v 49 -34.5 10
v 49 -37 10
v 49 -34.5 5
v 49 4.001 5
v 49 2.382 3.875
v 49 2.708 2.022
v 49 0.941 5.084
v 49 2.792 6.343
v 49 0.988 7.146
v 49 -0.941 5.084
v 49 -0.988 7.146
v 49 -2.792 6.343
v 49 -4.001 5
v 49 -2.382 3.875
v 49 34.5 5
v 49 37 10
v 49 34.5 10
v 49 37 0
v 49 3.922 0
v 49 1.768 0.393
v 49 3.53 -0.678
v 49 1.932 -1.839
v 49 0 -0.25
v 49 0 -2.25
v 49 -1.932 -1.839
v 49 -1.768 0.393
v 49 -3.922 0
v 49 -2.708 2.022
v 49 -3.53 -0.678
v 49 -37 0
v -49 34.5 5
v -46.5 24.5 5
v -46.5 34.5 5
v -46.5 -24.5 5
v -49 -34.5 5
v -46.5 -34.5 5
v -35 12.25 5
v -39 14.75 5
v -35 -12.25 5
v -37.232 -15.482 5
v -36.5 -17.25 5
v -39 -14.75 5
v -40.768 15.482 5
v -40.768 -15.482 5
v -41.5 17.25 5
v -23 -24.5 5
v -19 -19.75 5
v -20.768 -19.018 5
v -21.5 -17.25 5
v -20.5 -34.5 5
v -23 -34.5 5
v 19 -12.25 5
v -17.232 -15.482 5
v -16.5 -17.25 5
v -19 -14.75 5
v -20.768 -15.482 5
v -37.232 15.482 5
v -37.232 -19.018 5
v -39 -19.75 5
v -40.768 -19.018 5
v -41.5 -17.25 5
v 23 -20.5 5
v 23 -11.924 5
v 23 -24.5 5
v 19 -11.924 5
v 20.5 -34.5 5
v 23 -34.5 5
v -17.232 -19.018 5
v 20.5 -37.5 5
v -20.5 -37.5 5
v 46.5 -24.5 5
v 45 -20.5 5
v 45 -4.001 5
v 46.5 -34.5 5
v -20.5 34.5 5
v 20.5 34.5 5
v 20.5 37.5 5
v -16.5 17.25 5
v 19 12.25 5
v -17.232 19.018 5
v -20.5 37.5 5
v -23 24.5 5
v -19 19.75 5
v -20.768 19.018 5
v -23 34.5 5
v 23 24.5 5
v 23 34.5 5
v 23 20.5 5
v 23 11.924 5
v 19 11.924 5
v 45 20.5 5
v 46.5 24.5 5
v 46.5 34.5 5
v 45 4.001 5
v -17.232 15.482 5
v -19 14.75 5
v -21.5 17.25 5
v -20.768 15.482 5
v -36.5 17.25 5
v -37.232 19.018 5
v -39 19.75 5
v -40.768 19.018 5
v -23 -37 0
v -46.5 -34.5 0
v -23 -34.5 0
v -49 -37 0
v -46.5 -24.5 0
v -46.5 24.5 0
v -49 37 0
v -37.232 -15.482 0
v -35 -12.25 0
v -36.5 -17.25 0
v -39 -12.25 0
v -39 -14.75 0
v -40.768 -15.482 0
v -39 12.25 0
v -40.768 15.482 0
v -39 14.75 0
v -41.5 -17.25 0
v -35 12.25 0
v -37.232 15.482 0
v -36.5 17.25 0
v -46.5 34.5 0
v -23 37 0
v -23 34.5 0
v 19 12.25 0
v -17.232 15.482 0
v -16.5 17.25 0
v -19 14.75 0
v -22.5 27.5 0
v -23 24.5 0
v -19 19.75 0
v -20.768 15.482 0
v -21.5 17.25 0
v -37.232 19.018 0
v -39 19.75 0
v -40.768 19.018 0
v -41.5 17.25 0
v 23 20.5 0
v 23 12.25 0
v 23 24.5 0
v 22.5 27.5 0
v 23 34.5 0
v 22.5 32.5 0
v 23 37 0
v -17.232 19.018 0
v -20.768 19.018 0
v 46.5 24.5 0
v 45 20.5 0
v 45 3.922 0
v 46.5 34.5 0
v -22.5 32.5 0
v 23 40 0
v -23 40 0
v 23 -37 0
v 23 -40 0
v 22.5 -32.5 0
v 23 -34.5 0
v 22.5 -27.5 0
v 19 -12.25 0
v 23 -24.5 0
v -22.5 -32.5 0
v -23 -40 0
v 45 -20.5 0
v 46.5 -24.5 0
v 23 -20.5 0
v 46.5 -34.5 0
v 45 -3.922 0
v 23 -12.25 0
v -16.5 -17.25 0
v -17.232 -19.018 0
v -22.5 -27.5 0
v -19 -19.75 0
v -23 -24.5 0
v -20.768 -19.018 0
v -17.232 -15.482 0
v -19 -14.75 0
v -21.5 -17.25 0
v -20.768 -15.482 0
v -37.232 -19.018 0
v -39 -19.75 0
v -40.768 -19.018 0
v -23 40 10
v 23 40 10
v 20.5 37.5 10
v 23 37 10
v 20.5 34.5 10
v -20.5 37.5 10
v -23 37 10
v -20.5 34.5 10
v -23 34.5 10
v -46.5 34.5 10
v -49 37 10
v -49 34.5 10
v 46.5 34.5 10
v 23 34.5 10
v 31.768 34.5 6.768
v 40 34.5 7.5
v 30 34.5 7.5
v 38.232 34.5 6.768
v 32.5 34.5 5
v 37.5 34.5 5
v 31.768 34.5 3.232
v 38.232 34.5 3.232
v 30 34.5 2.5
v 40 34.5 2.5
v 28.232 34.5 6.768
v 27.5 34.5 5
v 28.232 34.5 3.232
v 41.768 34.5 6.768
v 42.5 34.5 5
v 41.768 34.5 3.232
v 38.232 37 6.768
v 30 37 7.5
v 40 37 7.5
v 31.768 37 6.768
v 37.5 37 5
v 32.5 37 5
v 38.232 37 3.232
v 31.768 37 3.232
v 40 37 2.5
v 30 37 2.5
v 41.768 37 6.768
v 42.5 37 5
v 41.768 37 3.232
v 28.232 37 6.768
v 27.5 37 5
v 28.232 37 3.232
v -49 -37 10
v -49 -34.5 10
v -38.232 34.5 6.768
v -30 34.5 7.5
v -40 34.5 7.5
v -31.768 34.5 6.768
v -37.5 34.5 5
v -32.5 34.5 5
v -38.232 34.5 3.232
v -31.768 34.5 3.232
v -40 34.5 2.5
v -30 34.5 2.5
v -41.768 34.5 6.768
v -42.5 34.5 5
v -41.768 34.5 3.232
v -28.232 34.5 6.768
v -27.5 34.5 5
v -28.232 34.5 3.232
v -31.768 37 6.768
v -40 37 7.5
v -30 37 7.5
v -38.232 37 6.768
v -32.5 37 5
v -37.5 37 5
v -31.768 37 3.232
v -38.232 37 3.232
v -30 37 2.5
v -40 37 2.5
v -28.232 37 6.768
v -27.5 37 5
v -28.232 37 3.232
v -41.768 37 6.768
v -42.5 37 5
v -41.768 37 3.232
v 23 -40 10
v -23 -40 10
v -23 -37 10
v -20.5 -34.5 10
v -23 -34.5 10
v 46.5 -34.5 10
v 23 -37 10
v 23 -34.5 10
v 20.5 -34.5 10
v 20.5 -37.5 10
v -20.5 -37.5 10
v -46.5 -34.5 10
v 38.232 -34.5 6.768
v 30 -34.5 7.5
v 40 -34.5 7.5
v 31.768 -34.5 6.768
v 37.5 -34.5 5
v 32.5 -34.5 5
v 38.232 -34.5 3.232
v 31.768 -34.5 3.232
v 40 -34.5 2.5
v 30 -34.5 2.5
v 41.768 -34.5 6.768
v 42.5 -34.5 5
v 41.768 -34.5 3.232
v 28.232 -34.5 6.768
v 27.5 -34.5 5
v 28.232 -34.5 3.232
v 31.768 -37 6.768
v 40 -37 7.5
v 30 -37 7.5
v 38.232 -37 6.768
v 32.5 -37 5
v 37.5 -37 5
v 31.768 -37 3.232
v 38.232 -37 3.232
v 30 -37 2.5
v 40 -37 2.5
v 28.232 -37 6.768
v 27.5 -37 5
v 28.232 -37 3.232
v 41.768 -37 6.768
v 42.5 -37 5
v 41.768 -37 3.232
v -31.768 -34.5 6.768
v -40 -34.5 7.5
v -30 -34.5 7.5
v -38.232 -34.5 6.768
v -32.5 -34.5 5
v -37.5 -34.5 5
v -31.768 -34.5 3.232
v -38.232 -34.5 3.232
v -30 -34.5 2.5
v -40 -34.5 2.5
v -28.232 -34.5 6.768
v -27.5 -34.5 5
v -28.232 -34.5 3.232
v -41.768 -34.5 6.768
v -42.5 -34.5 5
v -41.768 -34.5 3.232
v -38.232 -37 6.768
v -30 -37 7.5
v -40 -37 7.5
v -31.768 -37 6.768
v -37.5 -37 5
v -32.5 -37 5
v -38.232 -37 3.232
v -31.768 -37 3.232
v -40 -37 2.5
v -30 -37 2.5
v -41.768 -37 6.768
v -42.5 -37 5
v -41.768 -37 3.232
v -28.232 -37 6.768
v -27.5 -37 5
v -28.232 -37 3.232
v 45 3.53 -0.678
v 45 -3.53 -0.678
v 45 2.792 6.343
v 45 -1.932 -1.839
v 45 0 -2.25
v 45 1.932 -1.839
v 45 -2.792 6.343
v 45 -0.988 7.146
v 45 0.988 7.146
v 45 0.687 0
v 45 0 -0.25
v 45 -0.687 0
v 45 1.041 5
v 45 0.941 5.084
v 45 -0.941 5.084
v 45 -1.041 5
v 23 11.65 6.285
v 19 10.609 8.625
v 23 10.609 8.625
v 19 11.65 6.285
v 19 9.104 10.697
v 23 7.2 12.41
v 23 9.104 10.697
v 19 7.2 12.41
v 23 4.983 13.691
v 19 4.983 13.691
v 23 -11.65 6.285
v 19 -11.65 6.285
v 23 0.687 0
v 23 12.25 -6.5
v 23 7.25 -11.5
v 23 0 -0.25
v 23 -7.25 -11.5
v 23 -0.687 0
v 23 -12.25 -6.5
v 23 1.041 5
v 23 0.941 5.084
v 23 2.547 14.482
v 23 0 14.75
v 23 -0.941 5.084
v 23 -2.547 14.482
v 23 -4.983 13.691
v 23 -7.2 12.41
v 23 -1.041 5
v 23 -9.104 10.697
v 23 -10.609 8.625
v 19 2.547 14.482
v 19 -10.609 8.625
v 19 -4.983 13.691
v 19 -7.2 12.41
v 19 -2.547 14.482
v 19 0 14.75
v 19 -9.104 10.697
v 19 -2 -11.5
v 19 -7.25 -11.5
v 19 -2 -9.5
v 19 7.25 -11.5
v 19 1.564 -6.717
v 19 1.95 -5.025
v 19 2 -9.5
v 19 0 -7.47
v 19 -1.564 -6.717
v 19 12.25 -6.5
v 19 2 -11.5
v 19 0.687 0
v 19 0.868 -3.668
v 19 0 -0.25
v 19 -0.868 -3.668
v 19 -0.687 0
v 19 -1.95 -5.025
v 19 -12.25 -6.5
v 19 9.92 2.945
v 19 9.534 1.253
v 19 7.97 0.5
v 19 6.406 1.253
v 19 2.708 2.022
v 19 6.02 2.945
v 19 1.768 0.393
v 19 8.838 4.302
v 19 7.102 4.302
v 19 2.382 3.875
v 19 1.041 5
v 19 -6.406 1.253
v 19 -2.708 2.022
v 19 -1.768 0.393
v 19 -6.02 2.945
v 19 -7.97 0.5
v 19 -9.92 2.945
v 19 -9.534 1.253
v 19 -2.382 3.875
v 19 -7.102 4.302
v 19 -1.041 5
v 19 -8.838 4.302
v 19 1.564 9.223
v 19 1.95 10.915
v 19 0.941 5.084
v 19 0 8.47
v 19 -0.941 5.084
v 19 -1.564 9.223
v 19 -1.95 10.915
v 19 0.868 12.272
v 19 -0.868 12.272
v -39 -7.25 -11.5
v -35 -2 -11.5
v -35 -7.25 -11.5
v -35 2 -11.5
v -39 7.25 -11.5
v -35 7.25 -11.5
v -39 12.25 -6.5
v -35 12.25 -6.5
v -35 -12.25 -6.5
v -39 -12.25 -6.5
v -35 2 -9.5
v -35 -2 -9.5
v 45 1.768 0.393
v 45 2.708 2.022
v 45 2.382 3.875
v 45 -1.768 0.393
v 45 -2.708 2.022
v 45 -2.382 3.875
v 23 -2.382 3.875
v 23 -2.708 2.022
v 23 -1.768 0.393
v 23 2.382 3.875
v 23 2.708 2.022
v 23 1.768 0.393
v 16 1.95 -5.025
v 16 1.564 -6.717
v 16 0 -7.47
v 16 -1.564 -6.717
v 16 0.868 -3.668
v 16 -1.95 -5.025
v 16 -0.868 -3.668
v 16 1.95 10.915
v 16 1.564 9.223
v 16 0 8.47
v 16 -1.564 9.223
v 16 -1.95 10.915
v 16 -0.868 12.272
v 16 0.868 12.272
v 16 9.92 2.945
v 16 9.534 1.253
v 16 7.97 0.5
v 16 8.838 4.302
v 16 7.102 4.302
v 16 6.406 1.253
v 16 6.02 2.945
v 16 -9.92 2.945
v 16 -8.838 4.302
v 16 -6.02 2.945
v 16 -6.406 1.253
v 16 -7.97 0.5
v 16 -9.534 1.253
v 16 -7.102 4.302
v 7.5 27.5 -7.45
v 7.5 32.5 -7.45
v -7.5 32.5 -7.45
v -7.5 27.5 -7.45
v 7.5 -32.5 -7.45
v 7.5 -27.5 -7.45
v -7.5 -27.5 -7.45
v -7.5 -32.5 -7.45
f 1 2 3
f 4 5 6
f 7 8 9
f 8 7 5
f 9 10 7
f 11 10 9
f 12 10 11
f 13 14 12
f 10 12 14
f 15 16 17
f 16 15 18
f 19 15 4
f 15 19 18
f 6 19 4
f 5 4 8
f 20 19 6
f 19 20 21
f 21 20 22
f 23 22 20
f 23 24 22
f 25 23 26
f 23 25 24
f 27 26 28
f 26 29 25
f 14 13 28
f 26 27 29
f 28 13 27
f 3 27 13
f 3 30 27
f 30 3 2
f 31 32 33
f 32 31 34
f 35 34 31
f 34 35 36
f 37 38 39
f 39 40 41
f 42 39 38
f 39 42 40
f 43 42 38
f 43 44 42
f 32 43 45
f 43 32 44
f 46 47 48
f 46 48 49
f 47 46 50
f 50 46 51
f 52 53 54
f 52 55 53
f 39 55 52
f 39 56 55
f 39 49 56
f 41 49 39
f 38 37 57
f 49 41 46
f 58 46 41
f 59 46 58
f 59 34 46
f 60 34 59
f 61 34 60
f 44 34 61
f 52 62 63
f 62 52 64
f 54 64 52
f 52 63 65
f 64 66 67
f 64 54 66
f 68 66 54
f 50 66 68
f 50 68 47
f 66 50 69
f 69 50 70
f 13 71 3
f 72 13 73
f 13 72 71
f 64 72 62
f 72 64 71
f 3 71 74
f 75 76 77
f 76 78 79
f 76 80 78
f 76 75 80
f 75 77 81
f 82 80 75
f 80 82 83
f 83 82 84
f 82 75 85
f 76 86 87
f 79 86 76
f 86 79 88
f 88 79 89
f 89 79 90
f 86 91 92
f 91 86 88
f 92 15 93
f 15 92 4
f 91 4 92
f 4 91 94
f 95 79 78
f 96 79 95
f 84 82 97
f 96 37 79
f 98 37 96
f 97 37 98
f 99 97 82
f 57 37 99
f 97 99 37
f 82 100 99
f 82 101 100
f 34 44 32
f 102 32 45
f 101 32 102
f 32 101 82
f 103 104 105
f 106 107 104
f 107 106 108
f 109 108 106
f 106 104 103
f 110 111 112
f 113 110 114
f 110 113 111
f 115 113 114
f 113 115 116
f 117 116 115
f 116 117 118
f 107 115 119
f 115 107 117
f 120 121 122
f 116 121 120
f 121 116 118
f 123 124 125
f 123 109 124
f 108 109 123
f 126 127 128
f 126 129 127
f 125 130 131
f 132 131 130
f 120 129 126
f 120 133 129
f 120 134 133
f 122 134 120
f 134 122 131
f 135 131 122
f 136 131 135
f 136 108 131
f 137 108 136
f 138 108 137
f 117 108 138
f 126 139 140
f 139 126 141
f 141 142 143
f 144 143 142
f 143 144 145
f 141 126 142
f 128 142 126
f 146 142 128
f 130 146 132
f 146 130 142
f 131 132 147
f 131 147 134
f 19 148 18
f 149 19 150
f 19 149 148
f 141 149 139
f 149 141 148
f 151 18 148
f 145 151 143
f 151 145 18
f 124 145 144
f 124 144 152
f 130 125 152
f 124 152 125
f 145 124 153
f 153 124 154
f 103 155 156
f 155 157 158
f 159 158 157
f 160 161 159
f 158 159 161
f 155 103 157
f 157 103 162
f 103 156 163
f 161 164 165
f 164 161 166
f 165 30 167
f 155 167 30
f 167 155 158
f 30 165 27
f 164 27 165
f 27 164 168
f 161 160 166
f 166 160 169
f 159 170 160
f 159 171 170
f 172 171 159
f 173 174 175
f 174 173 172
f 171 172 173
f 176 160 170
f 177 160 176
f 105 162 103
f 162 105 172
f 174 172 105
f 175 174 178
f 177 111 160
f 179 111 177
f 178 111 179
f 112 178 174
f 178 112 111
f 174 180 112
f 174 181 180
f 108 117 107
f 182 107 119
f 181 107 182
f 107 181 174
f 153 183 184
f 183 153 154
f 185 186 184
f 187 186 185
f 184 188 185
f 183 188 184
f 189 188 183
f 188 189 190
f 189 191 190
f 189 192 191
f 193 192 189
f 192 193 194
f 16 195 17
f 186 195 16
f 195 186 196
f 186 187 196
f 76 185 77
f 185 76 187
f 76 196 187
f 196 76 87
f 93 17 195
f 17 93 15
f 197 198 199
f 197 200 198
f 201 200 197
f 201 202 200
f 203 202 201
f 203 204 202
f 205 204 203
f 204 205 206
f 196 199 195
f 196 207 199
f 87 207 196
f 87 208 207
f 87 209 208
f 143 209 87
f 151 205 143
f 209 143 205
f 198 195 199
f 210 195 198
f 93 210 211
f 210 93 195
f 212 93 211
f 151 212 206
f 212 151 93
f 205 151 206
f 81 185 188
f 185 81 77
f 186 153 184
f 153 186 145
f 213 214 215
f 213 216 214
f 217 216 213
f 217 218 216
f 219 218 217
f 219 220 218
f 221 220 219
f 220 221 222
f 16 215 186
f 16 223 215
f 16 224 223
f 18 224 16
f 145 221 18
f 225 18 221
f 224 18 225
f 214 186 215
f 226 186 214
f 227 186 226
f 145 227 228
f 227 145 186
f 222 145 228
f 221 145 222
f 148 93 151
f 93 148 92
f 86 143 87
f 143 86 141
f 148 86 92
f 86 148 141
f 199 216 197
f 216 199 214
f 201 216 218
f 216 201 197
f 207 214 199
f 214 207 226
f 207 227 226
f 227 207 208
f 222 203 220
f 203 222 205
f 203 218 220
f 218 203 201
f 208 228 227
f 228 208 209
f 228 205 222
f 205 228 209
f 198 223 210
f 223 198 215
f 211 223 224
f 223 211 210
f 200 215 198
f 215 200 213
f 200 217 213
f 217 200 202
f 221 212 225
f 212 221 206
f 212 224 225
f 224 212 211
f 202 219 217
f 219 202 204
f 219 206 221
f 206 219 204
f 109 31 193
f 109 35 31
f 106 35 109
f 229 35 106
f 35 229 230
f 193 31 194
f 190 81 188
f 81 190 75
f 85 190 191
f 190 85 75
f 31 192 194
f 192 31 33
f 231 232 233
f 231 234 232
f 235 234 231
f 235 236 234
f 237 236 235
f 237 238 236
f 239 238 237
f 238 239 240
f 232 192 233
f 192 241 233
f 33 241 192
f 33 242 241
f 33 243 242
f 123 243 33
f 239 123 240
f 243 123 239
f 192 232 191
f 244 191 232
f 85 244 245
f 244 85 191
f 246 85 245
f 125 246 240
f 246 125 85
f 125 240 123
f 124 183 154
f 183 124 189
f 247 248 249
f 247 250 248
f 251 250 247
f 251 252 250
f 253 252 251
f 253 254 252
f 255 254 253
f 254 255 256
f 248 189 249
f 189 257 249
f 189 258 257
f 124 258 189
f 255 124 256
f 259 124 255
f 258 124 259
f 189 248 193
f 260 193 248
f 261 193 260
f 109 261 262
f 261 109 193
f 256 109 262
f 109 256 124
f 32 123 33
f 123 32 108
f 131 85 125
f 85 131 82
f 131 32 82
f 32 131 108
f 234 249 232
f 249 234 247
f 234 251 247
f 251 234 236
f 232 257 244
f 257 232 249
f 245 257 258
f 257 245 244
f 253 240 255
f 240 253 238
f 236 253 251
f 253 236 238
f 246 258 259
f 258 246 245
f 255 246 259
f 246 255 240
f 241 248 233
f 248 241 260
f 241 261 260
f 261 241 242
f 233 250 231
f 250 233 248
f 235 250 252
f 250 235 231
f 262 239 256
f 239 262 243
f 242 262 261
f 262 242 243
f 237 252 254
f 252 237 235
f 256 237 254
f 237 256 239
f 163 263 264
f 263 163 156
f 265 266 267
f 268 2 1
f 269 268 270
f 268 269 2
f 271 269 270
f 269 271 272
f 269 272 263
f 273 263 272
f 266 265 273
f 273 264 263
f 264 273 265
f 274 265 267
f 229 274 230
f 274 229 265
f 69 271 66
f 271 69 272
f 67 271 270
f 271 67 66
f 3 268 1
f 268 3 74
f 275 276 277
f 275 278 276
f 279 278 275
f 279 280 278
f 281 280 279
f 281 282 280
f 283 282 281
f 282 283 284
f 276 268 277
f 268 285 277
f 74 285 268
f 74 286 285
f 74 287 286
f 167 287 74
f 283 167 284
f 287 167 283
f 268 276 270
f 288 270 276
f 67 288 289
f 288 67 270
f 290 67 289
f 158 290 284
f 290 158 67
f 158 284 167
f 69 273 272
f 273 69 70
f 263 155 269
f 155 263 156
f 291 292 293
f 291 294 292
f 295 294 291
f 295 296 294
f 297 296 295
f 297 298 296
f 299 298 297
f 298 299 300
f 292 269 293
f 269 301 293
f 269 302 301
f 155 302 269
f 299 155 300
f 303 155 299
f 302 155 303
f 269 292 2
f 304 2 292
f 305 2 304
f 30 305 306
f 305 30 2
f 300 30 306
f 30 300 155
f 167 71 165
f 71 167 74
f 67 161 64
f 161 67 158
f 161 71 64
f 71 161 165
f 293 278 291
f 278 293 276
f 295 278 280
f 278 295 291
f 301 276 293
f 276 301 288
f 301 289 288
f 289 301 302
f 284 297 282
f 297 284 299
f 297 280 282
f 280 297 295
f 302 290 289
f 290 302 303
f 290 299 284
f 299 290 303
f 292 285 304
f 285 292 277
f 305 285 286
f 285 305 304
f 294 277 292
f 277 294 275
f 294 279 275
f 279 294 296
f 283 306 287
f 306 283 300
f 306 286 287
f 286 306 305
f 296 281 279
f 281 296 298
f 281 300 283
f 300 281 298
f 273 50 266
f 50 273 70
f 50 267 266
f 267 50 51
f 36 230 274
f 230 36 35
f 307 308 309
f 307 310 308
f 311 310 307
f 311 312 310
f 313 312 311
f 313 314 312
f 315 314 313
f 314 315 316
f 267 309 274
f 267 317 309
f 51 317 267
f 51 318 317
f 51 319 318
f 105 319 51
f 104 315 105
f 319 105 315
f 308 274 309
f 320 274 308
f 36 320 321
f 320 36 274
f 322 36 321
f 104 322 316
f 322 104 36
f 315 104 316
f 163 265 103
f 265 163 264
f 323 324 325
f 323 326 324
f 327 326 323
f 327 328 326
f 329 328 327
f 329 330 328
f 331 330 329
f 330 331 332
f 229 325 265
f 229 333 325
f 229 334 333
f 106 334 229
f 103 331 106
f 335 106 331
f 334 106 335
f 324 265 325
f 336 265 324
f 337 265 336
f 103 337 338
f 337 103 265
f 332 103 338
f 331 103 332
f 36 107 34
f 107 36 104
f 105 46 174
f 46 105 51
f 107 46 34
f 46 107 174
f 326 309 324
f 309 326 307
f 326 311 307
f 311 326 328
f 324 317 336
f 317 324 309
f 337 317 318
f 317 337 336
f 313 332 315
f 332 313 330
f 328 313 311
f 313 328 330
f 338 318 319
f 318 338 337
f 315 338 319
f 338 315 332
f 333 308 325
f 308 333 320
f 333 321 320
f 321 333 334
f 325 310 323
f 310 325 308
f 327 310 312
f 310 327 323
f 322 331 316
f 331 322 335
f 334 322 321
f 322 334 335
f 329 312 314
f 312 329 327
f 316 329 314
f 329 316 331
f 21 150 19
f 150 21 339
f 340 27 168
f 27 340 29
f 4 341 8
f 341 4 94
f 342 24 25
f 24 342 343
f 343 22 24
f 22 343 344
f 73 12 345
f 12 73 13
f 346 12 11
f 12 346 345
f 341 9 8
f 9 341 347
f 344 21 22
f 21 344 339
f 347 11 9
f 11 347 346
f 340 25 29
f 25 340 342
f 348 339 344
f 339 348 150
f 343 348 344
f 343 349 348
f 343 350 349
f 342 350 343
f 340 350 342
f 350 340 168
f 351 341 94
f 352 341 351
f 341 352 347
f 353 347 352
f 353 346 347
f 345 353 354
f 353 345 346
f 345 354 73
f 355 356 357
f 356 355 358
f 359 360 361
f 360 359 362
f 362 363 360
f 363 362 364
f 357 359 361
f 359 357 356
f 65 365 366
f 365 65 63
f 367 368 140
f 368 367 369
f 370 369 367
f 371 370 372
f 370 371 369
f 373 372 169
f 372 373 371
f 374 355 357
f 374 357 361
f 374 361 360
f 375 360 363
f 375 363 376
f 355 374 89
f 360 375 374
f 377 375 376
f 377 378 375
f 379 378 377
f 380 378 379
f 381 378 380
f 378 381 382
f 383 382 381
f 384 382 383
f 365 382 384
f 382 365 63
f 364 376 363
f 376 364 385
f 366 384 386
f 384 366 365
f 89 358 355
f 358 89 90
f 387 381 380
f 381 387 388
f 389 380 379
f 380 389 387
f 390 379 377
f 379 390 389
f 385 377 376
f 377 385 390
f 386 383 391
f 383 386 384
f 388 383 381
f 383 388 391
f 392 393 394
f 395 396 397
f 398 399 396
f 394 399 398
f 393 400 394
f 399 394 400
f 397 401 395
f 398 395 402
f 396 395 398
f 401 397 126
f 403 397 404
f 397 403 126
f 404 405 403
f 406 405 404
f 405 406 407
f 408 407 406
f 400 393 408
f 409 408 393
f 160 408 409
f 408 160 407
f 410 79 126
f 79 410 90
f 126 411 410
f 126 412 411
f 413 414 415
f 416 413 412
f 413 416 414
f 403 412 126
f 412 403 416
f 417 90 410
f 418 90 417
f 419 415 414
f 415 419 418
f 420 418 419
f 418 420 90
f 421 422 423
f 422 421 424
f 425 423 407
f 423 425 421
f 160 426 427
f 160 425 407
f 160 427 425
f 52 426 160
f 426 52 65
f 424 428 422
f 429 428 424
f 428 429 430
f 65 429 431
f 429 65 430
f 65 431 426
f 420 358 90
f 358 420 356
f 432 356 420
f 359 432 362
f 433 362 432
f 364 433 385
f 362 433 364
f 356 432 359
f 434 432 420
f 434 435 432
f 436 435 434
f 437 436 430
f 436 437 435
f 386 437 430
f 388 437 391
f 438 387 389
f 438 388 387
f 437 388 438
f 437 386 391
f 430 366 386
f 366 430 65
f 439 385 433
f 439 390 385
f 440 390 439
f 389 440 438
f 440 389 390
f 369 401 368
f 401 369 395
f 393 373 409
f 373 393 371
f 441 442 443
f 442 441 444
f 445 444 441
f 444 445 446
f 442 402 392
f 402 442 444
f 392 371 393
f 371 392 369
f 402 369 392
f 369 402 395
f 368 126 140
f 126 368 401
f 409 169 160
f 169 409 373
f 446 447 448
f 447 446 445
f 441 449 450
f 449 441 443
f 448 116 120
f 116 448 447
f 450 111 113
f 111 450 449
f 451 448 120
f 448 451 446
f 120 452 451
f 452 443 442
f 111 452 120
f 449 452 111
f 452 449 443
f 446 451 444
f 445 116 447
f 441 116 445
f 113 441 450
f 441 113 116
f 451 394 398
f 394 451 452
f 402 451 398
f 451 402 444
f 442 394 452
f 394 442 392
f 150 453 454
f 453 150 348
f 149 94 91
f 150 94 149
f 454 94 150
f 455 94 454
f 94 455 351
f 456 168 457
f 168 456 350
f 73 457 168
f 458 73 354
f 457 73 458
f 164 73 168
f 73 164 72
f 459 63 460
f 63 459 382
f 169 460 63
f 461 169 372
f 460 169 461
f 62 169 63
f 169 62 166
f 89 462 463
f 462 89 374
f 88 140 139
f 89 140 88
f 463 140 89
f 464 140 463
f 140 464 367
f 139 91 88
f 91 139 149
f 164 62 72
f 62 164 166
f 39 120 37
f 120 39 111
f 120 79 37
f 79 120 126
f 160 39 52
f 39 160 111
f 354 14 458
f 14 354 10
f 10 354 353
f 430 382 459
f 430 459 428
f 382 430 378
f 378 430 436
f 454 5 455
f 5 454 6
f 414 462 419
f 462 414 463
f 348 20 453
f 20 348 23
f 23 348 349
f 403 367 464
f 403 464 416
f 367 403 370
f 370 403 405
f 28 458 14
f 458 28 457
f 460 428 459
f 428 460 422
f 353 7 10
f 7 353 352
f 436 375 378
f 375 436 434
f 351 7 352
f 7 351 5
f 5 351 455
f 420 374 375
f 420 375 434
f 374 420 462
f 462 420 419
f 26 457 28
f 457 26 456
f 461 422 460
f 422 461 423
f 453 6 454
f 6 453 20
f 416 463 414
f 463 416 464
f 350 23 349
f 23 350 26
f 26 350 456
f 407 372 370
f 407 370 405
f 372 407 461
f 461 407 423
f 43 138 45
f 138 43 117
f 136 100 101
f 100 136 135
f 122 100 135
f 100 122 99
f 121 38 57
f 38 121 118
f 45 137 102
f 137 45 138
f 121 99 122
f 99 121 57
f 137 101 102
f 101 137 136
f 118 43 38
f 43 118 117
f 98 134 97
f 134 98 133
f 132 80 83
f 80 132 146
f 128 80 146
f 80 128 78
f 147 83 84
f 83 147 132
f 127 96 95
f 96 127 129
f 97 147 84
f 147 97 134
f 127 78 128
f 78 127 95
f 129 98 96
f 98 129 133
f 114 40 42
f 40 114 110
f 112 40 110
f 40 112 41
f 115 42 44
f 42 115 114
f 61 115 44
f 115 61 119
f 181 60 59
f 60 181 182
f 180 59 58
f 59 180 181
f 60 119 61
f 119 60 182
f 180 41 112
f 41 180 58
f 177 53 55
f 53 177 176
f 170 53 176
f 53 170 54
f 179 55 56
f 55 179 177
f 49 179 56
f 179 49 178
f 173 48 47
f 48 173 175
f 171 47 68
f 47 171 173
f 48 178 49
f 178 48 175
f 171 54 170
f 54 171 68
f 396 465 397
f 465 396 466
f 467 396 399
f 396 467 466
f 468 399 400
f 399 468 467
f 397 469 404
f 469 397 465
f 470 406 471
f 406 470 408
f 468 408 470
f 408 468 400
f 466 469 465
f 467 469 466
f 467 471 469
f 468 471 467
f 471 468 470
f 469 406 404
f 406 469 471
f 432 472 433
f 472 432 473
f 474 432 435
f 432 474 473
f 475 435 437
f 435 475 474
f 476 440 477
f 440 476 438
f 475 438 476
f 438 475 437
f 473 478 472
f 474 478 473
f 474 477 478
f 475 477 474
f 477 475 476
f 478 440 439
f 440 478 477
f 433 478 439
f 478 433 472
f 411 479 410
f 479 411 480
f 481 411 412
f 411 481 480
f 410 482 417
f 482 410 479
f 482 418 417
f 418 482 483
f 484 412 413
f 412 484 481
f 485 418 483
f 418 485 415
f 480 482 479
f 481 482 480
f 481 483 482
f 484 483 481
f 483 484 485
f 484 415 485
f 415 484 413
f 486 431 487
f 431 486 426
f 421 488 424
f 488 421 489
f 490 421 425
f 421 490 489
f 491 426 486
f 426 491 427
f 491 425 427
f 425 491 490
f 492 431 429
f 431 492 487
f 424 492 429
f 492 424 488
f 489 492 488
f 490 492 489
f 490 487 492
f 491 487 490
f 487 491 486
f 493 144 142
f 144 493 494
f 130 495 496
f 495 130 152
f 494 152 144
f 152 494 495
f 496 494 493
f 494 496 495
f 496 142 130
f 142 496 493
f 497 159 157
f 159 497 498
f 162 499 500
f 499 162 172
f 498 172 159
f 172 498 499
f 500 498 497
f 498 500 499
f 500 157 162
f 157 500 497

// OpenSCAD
/*
 * Copyright (c) 2026 Patrick Charon
 * Licensed under CERN-OHL-P <https://cern-ohl.web.cern.ch/>
*/

frame_length = 98;
frame_width = 80;
frame_thickness = 5;

border_width = 2.5;
border_height = 5;
total_height = frame_thickness + border_height;

mount_step_length = 26;
mount_hole_width = 10;

screw_hole_spacing = 10;
screw_hole_offset = 7;
screw_hole_diameter = 5;

beam_thickness = 4;

shaft_diameter = 5.5;

motor_bay_width = 24.5;
motor_bay_length = 54;
motor_bay_depth = 11.5;
motor_bay_bevel = 5;
motor_bay_bar_width = 4;
motor_bay_bar_thickness = 2;

board_rack_screw_spacing = 20;
board_rack_screw_x = 48;
board_rack_screw_y = 5;
board_rack_screw_diameter = 5;

motor_knob_spacing = 7.97;
motor_knob_height = 3;
motor_knob_diameter = 4;

underside_reinforcement_width = 5;
underside_reinforcement_height = 7.45;
underside_reinforcement_length = 45;
underside_reinforcement_bevel = 15;
underside_reinforcement_spacing = 55;

module quarter_frame(mount_step_depth=3) {
    mount_step_x = frame_length / 2 - mount_step_length;
    mount_step_y = frame_width / 2 - mount_step_depth;

    difference() {
        union() {
            cube([frame_length / 2, frame_width / 2, frame_thickness]);

            translate([
                mount_step_x - border_width, 
                mount_step_y - border_width,
                0
            ]) {
                cube([
                    mount_step_length + border_width, 
                    border_width + mount_step_depth, 
                    total_height
                ]);
            }

            translate([0, frame_width / 2 - border_width, 0]) {
                cube([
                    frame_length / 2 - mount_step_length,
                    border_width,
                    total_height
                ]);
            }
        }

        mount_hole_y = mount_step_y - mount_hole_width - border_width;

        union() {
            translate([mount_step_x, mount_step_y, 0]) {
                cube([mount_step_length, mount_step_depth, total_height]);
            }

            translate([mount_step_x, mount_hole_y, 0]) {
                cube([
                    mount_step_length - border_width, 
                    mount_hole_width, 
                    total_height
                ]);
            }

            translate([
                mount_step_x + screw_hole_offset, 
                mount_step_y, 
                total_height / 2
            ]) rotate([90, 0, 0]) {
                cylinder(d=screw_hole_diameter, h=border_width);
            }

            translate([
                mount_step_x + screw_hole_spacing + screw_hole_offset,
                mount_step_y,
                total_height / 2
            ]) rotate([90, 0, 0]) {
                cylinder(d=screw_hole_diameter, h=border_width);
            }
        }
    }
}

module center_frame(mount_step_depth=3) {
    rear_hole_length = mount_step_length - beam_thickness;
    rear_hole_width = frame_width - 2 * (
        mount_step_depth + border_width + mount_hole_width + beam_thickness
    );

    rear_hole_x = (frame_length - rear_hole_length) / 2 - beam_thickness;

    motor_bay_x = frame_length / 2 - mount_step_length - beam_thickness;
    
    difference() {
        union() {
            quarter_frame(mount_step_depth);
            mirror([1, 0, 0]) {
                quarter_frame(mount_step_depth);
            }

            mirror([0, 1, 0]) {
                quarter_frame(mount_step_depth);
                mirror([1, 0, 0]) {
                    quarter_frame(mount_step_depth);
                }
            }

            translate([
                frame_length / 2 - beam_thickness, 
                0, 
                frame_thickness / 2
            ]) rotate([0, 90, 0]) {
                cylinder(
                    d = shaft_diameter + beam_thickness, 
                    h = beam_thickness
                );
            }

            translate([
                motor_bay_x, 
                0, 
                frame_thickness / 2
            ]) rotate([0, 90, 0]) {
                cylinder(
                    d = motor_bay_width, 
                    h = beam_thickness
                );
            }

            translate([
                motor_bay_x,
                0,
                0
            ]) rotate([0, 90, 0]) {
                linear_extrude(beam_thickness)
                    polygon([
                        [0, -motor_bay_width / 2],
                        [motor_bay_depth - motor_bay_bevel, -motor_bay_width / 2],
                        [motor_bay_depth, -motor_bay_width / 2 + motor_bay_bevel],
                        [motor_bay_depth, motor_bay_width / 2 - motor_bay_bevel],
                        [motor_bay_depth - motor_bay_bevel, motor_bay_width / 2],
                        [0, motor_bay_width / 2]
                    ]);
            }

            translate([
                motor_bay_x - motor_bay_length - beam_thickness,
                0,
                0
            ]) rotate([0, 90, 0]) {
                linear_extrude(beam_thickness)
                    polygon([
                        [0, -motor_bay_width / 2],
                        [motor_bay_depth - motor_bay_bevel, -motor_bay_width / 2],
                        [motor_bay_depth, -motor_bay_width / 2 + motor_bay_bevel],
                        [motor_bay_depth, motor_bay_width / 2 - motor_bay_bevel],
                        [motor_bay_depth - motor_bay_bevel, motor_bay_width / 2],
                        [0, motor_bay_width / 2]
                    ]);
            }

            translate([
                motor_bay_x - motor_bay_length / 2,
                0,
                -motor_bay_depth + motor_bay_bar_thickness / 2,
            ]) {
                cube([
                    motor_bay_length,
                    motor_bay_bar_width,
                    motor_bay_bar_thickness,
                ], center = true);
            }
        }

        union() {
            translate([
                rear_hole_x, 
                0, 
                frame_thickness / 2
            ]) {
                cube([
                    rear_hole_length, 
                    rear_hole_width, 
                    frame_thickness
                ], center = true);
            }

            translate([
                motor_bay_x - motor_bay_length / 2,
                0,
                frame_thickness / 2
            ]) {
                cube([
                    motor_bay_length,
                    motor_bay_width,
                    frame_thickness
                ], center = true);
            }

            translate([
                motor_bay_x, 
                0, 
                frame_thickness / 2
            ]) rotate([0, 90, 0]) {
                cylinder(
                    d = shaft_diameter, 
                    h = mount_step_length + beam_thickness
                );
            }

            translate([
                motor_bay_x - board_rack_screw_x - board_rack_screw_spacing / 2,
                motor_bay_width / 2 + board_rack_screw_y,
                frame_thickness / 2
            ]) rotate([0, 0, 0]) {
                cylinder(
                    d = board_rack_screw_diameter, 
                    h = frame_thickness, 
                    center=true
                );
            }

            translate([
                motor_bay_x - board_rack_screw_x + board_rack_screw_spacing / 2,
                motor_bay_width / 2 + board_rack_screw_y,
                frame_thickness / 2
            ]) rotate([0, 0, 0]) {
                cylinder(
                    d = board_rack_screw_diameter, 
                    h = frame_thickness, 
                    center=true
                );
            }

            translate([
                motor_bay_x - board_rack_screw_x - board_rack_screw_spacing / 2,
                -motor_bay_width / 2 - board_rack_screw_y,
                frame_thickness / 2
            ]) rotate([0, 0, 0]) {
                cylinder(
                    d = board_rack_screw_diameter, 
                    h = frame_thickness, 
                    center=true
                );
            }

            translate([
                motor_bay_x - board_rack_screw_x + board_rack_screw_spacing / 2,
                -motor_bay_width / 2 - board_rack_screw_y,
                frame_thickness / 2
            ]) rotate([0, 0, 0]) {
                cylinder(
                    d = board_rack_screw_diameter, 
                    h = frame_thickness, 
                    center=true
                );
            }
        }
    }

    translate([
        motor_bay_x - motor_knob_height / 2,
        0,
        frame_thickness / 2
    ]) rotate([0, 90, 0]) {
        translate([
            motor_knob_spacing,
            0,
            0
        ])
            cylinder(
                d = motor_knob_diameter,
                h = motor_knob_height,
                center = true
            );

        translate([
            -motor_knob_spacing,
            0,
            0
        ])
            cylinder(
                d = motor_knob_diameter,
                h = motor_knob_height,
                center = true
            );

        translate([
            0,
            motor_knob_spacing,
            0
        ])
            cylinder(
                d = motor_knob_diameter,
                h = motor_knob_height,
                center = true
            );

        translate([
            0,
            -motor_knob_spacing,
            0
        ])
            cylinder(
                d = motor_knob_diameter,
                h = motor_knob_height,
                center = true
            );
    }

    translate([
        0,
        underside_reinforcement_spacing / 2,
        0
    ]) rotate([-90, 0, 0]) {
        linear_extrude(underside_reinforcement_width)
            polygon([
                [-underside_reinforcement_length / 2, 0],
                [underside_reinforcement_length / 2, 0],
                [underside_reinforcement_length / 2 - underside_reinforcement_bevel, underside_reinforcement_height],
                [-underside_reinforcement_length / 2 + underside_reinforcement_bevel, underside_reinforcement_height]
            ]);
    }

    translate([
        0,
        -underside_reinforcement_spacing / 2 - underside_reinforcement_width,
        0
    ]) rotate([-90, 0, 0]) {
        linear_extrude(underside_reinforcement_width)
            polygon([
                [-underside_reinforcement_length / 2, 0],
                [underside_reinforcement_length / 2, 0],
                [underside_reinforcement_length / 2 - underside_reinforcement_bevel, underside_reinforcement_height],
                [-underside_reinforcement_length / 2 + underside_reinforcement_bevel, underside_reinforcement_height]
            ]);
    }
}

center_frame();
